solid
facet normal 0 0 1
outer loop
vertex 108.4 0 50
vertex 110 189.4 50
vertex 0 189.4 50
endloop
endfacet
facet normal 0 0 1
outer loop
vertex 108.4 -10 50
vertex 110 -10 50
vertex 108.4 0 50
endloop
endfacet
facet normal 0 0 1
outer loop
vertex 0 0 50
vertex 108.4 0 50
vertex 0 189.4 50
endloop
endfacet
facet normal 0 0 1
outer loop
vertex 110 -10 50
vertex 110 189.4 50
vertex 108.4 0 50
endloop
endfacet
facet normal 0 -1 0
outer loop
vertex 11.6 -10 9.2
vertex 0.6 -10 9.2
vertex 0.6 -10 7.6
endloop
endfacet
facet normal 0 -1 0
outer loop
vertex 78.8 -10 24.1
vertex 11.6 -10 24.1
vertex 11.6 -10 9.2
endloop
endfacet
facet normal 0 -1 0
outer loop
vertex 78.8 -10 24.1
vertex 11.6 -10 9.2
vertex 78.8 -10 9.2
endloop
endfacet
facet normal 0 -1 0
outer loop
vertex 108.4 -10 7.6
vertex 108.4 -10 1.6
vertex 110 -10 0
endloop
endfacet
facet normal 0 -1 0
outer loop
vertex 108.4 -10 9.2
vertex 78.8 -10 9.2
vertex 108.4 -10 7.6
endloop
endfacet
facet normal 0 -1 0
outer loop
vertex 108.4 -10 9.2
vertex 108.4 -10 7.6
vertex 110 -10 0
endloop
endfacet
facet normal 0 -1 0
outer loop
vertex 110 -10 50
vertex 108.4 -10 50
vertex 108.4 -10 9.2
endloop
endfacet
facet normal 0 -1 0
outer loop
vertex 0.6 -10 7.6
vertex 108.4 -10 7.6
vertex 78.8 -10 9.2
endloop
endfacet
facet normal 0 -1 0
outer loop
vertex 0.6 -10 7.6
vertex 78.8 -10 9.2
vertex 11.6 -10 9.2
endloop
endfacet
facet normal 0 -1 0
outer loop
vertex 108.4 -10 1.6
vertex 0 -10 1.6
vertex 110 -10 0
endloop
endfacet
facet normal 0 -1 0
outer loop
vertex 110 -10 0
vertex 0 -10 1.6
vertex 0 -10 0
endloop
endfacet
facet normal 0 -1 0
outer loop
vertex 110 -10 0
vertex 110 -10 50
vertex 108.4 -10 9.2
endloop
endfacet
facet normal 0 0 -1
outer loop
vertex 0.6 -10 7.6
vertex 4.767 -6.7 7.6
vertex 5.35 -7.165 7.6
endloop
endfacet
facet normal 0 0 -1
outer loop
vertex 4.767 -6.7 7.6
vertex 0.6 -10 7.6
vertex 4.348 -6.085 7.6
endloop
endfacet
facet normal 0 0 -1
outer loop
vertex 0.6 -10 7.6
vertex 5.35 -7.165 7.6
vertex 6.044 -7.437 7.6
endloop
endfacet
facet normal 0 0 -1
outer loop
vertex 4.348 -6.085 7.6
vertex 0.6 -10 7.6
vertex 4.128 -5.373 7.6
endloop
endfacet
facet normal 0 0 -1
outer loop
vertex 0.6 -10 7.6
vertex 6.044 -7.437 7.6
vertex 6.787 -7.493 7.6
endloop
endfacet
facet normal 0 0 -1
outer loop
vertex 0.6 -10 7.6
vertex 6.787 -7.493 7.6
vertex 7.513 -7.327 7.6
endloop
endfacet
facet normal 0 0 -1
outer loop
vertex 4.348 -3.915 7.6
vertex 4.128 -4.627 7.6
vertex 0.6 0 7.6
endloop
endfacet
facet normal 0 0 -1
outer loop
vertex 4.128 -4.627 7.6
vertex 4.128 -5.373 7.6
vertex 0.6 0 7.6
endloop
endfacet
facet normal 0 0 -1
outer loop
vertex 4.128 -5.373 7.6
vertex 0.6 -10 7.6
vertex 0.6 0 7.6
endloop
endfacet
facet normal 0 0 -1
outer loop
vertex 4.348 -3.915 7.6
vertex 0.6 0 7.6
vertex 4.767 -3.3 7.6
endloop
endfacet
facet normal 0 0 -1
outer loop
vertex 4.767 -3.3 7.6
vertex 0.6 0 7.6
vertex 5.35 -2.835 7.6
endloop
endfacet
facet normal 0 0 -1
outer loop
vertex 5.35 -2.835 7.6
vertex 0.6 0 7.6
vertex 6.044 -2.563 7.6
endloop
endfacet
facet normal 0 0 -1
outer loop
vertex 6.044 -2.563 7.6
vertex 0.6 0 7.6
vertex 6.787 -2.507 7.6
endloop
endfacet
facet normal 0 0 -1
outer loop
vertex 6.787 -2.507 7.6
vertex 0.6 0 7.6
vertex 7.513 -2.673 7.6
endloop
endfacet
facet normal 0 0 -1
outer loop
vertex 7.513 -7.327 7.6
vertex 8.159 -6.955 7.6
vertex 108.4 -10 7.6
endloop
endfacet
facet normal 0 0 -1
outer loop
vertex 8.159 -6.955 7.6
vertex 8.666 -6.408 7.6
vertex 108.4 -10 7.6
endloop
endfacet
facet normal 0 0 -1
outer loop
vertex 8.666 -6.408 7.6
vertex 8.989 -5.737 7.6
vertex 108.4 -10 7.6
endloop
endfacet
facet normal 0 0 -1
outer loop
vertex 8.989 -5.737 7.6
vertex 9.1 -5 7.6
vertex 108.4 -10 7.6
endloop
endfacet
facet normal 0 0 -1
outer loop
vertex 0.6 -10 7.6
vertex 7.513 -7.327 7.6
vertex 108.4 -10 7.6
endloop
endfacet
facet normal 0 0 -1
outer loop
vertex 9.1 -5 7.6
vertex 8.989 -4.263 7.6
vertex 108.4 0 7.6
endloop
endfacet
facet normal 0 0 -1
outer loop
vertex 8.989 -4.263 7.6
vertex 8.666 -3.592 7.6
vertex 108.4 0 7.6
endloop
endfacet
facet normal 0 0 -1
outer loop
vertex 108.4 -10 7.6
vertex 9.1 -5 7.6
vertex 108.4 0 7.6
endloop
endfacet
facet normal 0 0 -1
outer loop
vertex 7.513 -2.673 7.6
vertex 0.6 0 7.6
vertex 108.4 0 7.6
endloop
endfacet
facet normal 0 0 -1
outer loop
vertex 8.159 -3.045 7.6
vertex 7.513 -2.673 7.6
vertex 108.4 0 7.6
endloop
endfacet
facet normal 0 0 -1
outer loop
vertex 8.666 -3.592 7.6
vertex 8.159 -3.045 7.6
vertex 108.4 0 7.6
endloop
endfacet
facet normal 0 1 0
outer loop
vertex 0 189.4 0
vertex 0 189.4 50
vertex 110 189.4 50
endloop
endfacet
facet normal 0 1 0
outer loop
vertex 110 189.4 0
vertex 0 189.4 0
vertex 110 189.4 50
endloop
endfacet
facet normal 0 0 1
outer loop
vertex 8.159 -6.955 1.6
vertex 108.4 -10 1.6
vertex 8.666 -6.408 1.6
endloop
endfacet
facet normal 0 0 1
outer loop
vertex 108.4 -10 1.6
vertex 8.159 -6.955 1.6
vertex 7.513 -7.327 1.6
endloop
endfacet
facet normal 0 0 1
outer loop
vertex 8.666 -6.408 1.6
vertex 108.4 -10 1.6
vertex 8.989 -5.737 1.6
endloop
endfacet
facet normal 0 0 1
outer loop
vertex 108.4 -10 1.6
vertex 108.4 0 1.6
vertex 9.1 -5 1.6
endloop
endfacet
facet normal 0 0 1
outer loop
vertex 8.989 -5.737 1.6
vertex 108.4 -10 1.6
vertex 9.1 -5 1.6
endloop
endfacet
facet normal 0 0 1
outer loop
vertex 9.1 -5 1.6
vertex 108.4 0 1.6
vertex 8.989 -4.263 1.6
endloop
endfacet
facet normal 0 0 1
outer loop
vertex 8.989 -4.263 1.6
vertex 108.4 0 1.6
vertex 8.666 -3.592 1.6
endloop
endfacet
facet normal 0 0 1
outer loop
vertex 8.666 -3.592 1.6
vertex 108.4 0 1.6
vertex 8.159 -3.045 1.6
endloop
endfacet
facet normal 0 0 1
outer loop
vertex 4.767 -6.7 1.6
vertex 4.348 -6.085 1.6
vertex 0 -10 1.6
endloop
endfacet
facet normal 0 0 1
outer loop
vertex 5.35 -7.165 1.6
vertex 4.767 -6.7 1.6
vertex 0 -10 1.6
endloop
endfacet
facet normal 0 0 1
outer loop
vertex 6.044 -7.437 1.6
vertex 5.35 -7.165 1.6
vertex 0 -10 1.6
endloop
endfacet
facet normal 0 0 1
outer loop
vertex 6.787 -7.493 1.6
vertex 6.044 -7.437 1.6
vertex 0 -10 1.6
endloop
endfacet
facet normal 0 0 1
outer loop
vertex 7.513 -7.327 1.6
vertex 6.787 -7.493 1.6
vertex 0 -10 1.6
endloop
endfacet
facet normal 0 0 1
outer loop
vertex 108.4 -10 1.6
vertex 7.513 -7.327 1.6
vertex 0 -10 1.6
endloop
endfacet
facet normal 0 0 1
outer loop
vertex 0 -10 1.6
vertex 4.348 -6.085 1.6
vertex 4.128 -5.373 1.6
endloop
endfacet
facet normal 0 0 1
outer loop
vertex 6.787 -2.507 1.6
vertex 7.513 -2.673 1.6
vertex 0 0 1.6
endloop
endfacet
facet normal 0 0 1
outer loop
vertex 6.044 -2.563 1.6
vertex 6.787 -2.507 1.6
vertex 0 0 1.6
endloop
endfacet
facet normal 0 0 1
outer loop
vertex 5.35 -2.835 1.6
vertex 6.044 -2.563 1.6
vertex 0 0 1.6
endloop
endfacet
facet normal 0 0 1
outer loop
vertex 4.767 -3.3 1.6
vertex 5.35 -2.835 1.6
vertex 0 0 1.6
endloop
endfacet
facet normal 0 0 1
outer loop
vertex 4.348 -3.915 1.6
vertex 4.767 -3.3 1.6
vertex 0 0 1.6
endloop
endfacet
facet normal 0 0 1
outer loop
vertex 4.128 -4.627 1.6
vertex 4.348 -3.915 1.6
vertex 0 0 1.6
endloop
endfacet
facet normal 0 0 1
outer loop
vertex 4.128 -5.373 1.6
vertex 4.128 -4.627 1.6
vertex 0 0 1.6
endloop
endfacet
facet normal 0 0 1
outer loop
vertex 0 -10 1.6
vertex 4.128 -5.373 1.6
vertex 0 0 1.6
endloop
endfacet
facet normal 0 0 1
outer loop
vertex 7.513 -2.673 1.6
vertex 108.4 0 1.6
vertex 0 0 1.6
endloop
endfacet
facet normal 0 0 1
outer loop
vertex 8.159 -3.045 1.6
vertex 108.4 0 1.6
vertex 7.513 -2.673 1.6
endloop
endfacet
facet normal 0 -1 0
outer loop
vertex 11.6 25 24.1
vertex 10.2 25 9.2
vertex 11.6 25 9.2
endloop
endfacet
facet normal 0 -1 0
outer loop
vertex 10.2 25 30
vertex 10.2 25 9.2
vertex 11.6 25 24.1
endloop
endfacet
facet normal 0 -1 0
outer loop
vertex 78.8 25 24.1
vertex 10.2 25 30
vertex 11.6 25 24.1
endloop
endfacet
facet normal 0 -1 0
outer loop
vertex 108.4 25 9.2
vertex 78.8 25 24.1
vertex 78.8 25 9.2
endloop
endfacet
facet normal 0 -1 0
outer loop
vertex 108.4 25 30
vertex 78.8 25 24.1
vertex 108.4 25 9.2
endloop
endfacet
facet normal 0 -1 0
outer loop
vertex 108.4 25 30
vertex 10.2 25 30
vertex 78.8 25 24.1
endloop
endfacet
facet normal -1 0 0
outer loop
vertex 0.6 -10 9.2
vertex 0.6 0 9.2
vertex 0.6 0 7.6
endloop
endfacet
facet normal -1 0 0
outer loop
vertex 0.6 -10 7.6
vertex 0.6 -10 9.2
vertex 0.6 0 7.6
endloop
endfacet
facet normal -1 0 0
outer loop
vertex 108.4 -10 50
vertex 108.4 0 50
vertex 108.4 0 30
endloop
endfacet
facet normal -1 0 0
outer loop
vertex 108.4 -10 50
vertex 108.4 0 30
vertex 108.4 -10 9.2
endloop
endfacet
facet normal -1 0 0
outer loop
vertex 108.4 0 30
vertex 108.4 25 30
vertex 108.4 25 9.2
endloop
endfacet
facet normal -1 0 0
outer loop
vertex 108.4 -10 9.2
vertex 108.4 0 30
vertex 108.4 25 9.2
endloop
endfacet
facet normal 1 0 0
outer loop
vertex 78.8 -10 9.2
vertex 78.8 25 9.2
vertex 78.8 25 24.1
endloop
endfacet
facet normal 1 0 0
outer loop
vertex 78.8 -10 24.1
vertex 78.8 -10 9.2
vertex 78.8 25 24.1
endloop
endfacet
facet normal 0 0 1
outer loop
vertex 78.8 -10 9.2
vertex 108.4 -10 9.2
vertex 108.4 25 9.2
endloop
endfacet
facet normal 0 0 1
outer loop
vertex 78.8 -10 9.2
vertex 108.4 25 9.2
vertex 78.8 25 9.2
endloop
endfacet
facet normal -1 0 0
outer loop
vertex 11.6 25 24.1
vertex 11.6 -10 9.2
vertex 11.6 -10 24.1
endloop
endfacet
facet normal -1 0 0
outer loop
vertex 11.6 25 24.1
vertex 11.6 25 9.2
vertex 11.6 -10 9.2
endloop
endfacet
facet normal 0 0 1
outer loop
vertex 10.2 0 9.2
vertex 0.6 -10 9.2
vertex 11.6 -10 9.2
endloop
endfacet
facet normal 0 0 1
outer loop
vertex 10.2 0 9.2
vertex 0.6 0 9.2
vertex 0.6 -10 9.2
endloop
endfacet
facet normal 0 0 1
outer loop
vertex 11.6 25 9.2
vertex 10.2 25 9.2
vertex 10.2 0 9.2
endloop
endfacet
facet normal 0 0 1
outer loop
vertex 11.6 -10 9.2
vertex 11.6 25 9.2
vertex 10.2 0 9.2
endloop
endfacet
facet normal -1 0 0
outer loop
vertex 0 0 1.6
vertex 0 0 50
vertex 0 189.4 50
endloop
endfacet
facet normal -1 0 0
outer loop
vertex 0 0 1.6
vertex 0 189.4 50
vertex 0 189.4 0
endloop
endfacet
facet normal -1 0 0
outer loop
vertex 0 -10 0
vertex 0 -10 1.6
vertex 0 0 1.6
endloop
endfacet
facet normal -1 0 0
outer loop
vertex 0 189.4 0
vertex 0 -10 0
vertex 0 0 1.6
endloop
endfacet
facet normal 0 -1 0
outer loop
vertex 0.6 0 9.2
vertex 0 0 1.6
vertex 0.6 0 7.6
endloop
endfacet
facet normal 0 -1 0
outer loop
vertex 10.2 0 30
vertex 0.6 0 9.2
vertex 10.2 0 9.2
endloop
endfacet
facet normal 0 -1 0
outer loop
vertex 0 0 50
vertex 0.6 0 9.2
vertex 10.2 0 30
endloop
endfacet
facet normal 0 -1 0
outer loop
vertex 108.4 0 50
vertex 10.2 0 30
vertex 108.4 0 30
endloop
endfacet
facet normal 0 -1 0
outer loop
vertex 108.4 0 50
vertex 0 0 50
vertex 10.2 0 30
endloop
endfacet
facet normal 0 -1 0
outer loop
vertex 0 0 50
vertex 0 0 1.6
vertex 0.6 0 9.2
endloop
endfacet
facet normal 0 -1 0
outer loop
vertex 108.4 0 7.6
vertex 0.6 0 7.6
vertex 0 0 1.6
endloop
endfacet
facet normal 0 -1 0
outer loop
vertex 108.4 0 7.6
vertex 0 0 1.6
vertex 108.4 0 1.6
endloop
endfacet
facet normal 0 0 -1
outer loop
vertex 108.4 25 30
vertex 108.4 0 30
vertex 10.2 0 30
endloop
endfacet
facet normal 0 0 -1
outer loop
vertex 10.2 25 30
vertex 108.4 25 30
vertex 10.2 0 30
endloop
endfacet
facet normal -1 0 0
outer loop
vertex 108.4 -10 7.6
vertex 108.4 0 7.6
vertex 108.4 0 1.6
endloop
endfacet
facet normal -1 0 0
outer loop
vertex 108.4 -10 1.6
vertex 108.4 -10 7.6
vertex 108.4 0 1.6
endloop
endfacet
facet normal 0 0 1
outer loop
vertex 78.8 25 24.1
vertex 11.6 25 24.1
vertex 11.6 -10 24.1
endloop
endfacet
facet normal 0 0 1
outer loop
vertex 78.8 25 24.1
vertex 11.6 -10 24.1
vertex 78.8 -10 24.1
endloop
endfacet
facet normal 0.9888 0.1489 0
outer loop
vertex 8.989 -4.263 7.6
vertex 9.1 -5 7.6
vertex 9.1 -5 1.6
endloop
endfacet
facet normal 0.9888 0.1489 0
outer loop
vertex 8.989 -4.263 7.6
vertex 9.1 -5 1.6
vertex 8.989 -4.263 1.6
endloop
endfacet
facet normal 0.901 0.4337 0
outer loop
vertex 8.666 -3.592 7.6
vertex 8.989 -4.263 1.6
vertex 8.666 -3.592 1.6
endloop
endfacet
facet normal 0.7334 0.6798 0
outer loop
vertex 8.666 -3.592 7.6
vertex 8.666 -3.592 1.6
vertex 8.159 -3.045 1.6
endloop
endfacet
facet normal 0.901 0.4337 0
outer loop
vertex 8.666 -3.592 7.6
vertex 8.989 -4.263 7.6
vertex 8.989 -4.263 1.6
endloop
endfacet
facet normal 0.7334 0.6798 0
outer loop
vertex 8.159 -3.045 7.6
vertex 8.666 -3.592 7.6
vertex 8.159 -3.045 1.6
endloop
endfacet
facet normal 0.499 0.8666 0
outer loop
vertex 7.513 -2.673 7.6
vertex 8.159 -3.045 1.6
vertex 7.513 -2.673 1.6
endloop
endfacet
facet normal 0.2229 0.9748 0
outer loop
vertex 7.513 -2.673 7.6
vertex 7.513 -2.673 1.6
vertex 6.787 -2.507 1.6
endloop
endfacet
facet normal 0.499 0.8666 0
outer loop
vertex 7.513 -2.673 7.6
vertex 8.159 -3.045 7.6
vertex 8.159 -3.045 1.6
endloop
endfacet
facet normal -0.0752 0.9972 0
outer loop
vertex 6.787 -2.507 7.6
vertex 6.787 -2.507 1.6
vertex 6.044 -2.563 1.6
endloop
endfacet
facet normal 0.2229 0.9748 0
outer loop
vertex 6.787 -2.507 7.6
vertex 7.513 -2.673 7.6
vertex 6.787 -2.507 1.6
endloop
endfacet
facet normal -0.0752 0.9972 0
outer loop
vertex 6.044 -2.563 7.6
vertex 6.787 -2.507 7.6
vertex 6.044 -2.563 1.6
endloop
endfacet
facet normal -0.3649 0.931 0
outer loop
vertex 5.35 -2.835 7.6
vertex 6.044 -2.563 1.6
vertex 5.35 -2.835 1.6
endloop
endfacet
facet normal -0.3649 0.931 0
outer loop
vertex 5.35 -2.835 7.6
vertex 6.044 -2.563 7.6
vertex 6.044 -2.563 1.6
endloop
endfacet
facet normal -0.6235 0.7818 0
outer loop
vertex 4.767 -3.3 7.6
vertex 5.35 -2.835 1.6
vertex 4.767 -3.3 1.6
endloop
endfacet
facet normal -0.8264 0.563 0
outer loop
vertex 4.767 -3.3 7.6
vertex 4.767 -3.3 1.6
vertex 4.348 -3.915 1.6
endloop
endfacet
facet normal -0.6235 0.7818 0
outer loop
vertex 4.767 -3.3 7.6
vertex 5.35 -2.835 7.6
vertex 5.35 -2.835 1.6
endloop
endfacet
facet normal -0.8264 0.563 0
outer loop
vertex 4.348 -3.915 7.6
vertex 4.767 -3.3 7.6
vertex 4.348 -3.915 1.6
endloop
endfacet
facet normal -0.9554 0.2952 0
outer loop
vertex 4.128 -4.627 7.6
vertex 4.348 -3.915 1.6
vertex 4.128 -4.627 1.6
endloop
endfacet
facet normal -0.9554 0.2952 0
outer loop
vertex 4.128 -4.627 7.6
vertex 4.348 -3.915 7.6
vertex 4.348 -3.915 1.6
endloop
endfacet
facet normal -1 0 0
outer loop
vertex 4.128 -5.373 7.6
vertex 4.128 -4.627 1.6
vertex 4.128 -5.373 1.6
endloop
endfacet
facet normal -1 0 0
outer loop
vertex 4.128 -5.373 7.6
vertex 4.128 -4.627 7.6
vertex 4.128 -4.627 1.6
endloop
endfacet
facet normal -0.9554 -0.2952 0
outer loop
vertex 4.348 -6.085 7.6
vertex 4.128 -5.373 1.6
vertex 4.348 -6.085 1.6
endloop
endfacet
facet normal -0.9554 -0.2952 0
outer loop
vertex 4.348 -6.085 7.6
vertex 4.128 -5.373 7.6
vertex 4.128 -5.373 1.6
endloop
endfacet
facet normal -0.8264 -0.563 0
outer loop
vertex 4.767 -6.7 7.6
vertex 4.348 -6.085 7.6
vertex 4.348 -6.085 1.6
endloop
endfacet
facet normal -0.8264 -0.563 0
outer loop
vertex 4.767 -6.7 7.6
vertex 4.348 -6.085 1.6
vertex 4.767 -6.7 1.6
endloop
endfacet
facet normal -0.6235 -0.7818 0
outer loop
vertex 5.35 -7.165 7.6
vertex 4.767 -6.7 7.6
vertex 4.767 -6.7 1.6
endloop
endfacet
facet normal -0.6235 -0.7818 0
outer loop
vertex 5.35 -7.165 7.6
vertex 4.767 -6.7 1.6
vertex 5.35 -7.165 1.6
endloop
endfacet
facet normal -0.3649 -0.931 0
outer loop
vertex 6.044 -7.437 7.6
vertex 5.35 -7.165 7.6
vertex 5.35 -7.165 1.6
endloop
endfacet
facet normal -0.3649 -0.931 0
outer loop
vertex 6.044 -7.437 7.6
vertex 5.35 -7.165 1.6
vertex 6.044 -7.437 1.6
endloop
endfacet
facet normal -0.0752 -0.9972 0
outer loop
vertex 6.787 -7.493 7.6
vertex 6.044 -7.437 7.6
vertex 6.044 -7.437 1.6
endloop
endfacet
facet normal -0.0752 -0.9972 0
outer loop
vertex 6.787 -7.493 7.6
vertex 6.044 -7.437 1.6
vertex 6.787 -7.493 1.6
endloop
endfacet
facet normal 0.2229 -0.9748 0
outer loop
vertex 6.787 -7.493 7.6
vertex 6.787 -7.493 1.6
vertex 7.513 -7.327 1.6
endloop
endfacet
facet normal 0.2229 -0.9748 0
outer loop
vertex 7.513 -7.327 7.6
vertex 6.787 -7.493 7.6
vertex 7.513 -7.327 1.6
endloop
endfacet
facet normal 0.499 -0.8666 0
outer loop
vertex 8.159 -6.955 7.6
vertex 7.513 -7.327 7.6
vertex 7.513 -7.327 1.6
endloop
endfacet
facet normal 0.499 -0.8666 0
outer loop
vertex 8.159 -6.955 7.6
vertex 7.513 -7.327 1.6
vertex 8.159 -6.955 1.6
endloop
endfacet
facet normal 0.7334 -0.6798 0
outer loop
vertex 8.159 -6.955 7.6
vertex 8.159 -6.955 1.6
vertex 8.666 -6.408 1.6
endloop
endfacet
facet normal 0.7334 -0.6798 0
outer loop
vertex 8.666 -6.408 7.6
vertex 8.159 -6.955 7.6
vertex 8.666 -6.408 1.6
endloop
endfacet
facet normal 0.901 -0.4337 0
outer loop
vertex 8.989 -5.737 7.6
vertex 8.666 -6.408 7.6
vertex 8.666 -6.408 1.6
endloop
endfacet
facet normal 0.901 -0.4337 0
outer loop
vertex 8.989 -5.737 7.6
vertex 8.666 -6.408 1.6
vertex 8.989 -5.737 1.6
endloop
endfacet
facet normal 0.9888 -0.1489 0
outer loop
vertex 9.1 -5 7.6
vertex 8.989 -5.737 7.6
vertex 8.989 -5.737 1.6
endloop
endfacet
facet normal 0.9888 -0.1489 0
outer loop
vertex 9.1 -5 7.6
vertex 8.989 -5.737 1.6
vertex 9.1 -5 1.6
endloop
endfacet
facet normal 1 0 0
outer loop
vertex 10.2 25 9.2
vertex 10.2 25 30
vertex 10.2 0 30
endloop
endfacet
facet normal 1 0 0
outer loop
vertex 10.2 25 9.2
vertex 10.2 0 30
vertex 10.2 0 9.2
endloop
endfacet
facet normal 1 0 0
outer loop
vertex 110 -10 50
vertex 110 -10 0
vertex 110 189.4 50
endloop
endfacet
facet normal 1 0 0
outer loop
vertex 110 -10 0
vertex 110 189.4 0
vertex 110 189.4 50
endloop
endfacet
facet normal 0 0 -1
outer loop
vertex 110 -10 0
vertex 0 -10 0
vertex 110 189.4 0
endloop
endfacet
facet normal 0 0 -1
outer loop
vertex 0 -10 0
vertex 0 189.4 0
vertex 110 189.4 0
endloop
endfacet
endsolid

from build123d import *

# Parameters (mm, degrees)
F0_W     = 98.2
F0_H     = 0.6
F0_W_2   = 9.6
F0_W_3   = 0.6
F0_H_2   = 40.2
F0_H_3   = 1.6
F0_H_4   = 6
F0_W_4   = 107.8
F0_W_5   = 1.6
F0_H_5   = 19.4
F0_W_6   = 67.2
F0_H_6   = 14.9
F1_DEPTH = 189.4
F2_DEPTH = 10
F3_DEPTH = 25
F4_R     = 2.5
F5_DEPTH = 7.6


with BuildPart() as f1:
    # F0 (on Front) → F1 (new body)
    with BuildSketch(Plane.XZ):
        with Locations((59.3, 49.7)):
            Rectangle(F0_W, F0_H)
        with Locations((5.4, 49.7)):
            Rectangle(F0_W_2, F0_H)
        with Locations((0.3, 29.3)):
            Rectangle(F0_W_3, F0_H_2)
        with Locations((0.3, 8.4)):
            Rectangle(F0_W_3, F0_H_3)
        with Locations((0.3, 4.6)):
            Rectangle(F0_W_3, F0_H_4)
        with Locations((0.3, 0.8)):
            Rectangle(F0_W_3, F0_H_3)
        with Locations((54.5, 0.8)):
            Rectangle(F0_W_4, F0_H_3)
        Polygon((108.4, 1.6), (108.4, 0), (110, 0), (110, 49.4), (108.4, 49.4), (108.4, 30), (108.4, 9.2), (108.4, 7.6), align=None)
        with Locations((109.2, 49.7)):
            Rectangle(F0_W_5, F0_H)
        with Locations((0.3, 49.7)):
            Rectangle(F0_W_3, F0_H)
        Polygon((0.6, 9.2), (0.6, 7.6), (108.4, 7.6), (108.4, 9.2), (78.8, 9.2), (11.6, 9.2), (10.2, 9.2), align=None)
        Polygon((0.6, 49.4), (0.6, 9.2), (10.2, 9.2), (10.2, 30), (10.2, 49.4), align=None)
        with Locations((59.3, 39.7)):
            Rectangle(F0_W, F0_H_5)
        Polygon((78.8, 9.2), (108.4, 9.2), (108.4, 30), (10.2, 30), (10.2, 9.2), (11.6, 9.2), (11.6, 24.1), (78.8, 24.1), align=None)
        with Locations((45.2, 16.65)):
            Rectangle(F0_W_6, F0_H_6)
        with Locations((54.5, 4.6)):
            Rectangle(F0_W_4, F0_H_4)
    extrude(amount=-F1_DEPTH)

    # F0 (on Front) → F2 (join)
    with BuildSketch(Plane.XZ):
        with Locations((45.2, 16.65)):
            Rectangle(F0_W_6, F0_H_6)
        Polygon((108.4, 1.6), (108.4, 0), (110, 0), (110, 49.4), (108.4, 49.4), (108.4, 30), (108.4, 9.2), (108.4, 7.6), align=None)
        with Locations((54.5, 0.8)):
            Rectangle(F0_W_4, F0_H_3)
        with Locations((109.2, 49.7)):
            Rectangle(F0_W_5, F0_H)
        with Locations((0.3, 0.8)):
            Rectangle(F0_W_3, F0_H_3)
        Polygon((0.6, 9.2), (0.6, 7.6), (108.4, 7.6), (108.4, 9.2), (78.8, 9.2), (11.6, 9.2), (10.2, 9.2), align=None)
    extrude(amount=F2_DEPTH)

    # F0 (on Front) → F3 (cut)
    with BuildSketch(Plane.XZ):
        Polygon((78.8, 9.2), (108.4, 9.2), (108.4, 30), (10.2, 30), (10.2, 9.2), (11.6, 9.2), (11.6, 24.1), (78.8, 24.1), align=None)
    extrude(amount=-F3_DEPTH, mode=Mode.SUBTRACT)

    # F4 (on face) → F5 (join, through all)
    with BuildSketch(Plane.XY.offset(9.2)):
        with Locations((6.6, -5)):
            Circle(F4_R)
    extrude(amount=-F5_DEPTH)


solid = f1.part
